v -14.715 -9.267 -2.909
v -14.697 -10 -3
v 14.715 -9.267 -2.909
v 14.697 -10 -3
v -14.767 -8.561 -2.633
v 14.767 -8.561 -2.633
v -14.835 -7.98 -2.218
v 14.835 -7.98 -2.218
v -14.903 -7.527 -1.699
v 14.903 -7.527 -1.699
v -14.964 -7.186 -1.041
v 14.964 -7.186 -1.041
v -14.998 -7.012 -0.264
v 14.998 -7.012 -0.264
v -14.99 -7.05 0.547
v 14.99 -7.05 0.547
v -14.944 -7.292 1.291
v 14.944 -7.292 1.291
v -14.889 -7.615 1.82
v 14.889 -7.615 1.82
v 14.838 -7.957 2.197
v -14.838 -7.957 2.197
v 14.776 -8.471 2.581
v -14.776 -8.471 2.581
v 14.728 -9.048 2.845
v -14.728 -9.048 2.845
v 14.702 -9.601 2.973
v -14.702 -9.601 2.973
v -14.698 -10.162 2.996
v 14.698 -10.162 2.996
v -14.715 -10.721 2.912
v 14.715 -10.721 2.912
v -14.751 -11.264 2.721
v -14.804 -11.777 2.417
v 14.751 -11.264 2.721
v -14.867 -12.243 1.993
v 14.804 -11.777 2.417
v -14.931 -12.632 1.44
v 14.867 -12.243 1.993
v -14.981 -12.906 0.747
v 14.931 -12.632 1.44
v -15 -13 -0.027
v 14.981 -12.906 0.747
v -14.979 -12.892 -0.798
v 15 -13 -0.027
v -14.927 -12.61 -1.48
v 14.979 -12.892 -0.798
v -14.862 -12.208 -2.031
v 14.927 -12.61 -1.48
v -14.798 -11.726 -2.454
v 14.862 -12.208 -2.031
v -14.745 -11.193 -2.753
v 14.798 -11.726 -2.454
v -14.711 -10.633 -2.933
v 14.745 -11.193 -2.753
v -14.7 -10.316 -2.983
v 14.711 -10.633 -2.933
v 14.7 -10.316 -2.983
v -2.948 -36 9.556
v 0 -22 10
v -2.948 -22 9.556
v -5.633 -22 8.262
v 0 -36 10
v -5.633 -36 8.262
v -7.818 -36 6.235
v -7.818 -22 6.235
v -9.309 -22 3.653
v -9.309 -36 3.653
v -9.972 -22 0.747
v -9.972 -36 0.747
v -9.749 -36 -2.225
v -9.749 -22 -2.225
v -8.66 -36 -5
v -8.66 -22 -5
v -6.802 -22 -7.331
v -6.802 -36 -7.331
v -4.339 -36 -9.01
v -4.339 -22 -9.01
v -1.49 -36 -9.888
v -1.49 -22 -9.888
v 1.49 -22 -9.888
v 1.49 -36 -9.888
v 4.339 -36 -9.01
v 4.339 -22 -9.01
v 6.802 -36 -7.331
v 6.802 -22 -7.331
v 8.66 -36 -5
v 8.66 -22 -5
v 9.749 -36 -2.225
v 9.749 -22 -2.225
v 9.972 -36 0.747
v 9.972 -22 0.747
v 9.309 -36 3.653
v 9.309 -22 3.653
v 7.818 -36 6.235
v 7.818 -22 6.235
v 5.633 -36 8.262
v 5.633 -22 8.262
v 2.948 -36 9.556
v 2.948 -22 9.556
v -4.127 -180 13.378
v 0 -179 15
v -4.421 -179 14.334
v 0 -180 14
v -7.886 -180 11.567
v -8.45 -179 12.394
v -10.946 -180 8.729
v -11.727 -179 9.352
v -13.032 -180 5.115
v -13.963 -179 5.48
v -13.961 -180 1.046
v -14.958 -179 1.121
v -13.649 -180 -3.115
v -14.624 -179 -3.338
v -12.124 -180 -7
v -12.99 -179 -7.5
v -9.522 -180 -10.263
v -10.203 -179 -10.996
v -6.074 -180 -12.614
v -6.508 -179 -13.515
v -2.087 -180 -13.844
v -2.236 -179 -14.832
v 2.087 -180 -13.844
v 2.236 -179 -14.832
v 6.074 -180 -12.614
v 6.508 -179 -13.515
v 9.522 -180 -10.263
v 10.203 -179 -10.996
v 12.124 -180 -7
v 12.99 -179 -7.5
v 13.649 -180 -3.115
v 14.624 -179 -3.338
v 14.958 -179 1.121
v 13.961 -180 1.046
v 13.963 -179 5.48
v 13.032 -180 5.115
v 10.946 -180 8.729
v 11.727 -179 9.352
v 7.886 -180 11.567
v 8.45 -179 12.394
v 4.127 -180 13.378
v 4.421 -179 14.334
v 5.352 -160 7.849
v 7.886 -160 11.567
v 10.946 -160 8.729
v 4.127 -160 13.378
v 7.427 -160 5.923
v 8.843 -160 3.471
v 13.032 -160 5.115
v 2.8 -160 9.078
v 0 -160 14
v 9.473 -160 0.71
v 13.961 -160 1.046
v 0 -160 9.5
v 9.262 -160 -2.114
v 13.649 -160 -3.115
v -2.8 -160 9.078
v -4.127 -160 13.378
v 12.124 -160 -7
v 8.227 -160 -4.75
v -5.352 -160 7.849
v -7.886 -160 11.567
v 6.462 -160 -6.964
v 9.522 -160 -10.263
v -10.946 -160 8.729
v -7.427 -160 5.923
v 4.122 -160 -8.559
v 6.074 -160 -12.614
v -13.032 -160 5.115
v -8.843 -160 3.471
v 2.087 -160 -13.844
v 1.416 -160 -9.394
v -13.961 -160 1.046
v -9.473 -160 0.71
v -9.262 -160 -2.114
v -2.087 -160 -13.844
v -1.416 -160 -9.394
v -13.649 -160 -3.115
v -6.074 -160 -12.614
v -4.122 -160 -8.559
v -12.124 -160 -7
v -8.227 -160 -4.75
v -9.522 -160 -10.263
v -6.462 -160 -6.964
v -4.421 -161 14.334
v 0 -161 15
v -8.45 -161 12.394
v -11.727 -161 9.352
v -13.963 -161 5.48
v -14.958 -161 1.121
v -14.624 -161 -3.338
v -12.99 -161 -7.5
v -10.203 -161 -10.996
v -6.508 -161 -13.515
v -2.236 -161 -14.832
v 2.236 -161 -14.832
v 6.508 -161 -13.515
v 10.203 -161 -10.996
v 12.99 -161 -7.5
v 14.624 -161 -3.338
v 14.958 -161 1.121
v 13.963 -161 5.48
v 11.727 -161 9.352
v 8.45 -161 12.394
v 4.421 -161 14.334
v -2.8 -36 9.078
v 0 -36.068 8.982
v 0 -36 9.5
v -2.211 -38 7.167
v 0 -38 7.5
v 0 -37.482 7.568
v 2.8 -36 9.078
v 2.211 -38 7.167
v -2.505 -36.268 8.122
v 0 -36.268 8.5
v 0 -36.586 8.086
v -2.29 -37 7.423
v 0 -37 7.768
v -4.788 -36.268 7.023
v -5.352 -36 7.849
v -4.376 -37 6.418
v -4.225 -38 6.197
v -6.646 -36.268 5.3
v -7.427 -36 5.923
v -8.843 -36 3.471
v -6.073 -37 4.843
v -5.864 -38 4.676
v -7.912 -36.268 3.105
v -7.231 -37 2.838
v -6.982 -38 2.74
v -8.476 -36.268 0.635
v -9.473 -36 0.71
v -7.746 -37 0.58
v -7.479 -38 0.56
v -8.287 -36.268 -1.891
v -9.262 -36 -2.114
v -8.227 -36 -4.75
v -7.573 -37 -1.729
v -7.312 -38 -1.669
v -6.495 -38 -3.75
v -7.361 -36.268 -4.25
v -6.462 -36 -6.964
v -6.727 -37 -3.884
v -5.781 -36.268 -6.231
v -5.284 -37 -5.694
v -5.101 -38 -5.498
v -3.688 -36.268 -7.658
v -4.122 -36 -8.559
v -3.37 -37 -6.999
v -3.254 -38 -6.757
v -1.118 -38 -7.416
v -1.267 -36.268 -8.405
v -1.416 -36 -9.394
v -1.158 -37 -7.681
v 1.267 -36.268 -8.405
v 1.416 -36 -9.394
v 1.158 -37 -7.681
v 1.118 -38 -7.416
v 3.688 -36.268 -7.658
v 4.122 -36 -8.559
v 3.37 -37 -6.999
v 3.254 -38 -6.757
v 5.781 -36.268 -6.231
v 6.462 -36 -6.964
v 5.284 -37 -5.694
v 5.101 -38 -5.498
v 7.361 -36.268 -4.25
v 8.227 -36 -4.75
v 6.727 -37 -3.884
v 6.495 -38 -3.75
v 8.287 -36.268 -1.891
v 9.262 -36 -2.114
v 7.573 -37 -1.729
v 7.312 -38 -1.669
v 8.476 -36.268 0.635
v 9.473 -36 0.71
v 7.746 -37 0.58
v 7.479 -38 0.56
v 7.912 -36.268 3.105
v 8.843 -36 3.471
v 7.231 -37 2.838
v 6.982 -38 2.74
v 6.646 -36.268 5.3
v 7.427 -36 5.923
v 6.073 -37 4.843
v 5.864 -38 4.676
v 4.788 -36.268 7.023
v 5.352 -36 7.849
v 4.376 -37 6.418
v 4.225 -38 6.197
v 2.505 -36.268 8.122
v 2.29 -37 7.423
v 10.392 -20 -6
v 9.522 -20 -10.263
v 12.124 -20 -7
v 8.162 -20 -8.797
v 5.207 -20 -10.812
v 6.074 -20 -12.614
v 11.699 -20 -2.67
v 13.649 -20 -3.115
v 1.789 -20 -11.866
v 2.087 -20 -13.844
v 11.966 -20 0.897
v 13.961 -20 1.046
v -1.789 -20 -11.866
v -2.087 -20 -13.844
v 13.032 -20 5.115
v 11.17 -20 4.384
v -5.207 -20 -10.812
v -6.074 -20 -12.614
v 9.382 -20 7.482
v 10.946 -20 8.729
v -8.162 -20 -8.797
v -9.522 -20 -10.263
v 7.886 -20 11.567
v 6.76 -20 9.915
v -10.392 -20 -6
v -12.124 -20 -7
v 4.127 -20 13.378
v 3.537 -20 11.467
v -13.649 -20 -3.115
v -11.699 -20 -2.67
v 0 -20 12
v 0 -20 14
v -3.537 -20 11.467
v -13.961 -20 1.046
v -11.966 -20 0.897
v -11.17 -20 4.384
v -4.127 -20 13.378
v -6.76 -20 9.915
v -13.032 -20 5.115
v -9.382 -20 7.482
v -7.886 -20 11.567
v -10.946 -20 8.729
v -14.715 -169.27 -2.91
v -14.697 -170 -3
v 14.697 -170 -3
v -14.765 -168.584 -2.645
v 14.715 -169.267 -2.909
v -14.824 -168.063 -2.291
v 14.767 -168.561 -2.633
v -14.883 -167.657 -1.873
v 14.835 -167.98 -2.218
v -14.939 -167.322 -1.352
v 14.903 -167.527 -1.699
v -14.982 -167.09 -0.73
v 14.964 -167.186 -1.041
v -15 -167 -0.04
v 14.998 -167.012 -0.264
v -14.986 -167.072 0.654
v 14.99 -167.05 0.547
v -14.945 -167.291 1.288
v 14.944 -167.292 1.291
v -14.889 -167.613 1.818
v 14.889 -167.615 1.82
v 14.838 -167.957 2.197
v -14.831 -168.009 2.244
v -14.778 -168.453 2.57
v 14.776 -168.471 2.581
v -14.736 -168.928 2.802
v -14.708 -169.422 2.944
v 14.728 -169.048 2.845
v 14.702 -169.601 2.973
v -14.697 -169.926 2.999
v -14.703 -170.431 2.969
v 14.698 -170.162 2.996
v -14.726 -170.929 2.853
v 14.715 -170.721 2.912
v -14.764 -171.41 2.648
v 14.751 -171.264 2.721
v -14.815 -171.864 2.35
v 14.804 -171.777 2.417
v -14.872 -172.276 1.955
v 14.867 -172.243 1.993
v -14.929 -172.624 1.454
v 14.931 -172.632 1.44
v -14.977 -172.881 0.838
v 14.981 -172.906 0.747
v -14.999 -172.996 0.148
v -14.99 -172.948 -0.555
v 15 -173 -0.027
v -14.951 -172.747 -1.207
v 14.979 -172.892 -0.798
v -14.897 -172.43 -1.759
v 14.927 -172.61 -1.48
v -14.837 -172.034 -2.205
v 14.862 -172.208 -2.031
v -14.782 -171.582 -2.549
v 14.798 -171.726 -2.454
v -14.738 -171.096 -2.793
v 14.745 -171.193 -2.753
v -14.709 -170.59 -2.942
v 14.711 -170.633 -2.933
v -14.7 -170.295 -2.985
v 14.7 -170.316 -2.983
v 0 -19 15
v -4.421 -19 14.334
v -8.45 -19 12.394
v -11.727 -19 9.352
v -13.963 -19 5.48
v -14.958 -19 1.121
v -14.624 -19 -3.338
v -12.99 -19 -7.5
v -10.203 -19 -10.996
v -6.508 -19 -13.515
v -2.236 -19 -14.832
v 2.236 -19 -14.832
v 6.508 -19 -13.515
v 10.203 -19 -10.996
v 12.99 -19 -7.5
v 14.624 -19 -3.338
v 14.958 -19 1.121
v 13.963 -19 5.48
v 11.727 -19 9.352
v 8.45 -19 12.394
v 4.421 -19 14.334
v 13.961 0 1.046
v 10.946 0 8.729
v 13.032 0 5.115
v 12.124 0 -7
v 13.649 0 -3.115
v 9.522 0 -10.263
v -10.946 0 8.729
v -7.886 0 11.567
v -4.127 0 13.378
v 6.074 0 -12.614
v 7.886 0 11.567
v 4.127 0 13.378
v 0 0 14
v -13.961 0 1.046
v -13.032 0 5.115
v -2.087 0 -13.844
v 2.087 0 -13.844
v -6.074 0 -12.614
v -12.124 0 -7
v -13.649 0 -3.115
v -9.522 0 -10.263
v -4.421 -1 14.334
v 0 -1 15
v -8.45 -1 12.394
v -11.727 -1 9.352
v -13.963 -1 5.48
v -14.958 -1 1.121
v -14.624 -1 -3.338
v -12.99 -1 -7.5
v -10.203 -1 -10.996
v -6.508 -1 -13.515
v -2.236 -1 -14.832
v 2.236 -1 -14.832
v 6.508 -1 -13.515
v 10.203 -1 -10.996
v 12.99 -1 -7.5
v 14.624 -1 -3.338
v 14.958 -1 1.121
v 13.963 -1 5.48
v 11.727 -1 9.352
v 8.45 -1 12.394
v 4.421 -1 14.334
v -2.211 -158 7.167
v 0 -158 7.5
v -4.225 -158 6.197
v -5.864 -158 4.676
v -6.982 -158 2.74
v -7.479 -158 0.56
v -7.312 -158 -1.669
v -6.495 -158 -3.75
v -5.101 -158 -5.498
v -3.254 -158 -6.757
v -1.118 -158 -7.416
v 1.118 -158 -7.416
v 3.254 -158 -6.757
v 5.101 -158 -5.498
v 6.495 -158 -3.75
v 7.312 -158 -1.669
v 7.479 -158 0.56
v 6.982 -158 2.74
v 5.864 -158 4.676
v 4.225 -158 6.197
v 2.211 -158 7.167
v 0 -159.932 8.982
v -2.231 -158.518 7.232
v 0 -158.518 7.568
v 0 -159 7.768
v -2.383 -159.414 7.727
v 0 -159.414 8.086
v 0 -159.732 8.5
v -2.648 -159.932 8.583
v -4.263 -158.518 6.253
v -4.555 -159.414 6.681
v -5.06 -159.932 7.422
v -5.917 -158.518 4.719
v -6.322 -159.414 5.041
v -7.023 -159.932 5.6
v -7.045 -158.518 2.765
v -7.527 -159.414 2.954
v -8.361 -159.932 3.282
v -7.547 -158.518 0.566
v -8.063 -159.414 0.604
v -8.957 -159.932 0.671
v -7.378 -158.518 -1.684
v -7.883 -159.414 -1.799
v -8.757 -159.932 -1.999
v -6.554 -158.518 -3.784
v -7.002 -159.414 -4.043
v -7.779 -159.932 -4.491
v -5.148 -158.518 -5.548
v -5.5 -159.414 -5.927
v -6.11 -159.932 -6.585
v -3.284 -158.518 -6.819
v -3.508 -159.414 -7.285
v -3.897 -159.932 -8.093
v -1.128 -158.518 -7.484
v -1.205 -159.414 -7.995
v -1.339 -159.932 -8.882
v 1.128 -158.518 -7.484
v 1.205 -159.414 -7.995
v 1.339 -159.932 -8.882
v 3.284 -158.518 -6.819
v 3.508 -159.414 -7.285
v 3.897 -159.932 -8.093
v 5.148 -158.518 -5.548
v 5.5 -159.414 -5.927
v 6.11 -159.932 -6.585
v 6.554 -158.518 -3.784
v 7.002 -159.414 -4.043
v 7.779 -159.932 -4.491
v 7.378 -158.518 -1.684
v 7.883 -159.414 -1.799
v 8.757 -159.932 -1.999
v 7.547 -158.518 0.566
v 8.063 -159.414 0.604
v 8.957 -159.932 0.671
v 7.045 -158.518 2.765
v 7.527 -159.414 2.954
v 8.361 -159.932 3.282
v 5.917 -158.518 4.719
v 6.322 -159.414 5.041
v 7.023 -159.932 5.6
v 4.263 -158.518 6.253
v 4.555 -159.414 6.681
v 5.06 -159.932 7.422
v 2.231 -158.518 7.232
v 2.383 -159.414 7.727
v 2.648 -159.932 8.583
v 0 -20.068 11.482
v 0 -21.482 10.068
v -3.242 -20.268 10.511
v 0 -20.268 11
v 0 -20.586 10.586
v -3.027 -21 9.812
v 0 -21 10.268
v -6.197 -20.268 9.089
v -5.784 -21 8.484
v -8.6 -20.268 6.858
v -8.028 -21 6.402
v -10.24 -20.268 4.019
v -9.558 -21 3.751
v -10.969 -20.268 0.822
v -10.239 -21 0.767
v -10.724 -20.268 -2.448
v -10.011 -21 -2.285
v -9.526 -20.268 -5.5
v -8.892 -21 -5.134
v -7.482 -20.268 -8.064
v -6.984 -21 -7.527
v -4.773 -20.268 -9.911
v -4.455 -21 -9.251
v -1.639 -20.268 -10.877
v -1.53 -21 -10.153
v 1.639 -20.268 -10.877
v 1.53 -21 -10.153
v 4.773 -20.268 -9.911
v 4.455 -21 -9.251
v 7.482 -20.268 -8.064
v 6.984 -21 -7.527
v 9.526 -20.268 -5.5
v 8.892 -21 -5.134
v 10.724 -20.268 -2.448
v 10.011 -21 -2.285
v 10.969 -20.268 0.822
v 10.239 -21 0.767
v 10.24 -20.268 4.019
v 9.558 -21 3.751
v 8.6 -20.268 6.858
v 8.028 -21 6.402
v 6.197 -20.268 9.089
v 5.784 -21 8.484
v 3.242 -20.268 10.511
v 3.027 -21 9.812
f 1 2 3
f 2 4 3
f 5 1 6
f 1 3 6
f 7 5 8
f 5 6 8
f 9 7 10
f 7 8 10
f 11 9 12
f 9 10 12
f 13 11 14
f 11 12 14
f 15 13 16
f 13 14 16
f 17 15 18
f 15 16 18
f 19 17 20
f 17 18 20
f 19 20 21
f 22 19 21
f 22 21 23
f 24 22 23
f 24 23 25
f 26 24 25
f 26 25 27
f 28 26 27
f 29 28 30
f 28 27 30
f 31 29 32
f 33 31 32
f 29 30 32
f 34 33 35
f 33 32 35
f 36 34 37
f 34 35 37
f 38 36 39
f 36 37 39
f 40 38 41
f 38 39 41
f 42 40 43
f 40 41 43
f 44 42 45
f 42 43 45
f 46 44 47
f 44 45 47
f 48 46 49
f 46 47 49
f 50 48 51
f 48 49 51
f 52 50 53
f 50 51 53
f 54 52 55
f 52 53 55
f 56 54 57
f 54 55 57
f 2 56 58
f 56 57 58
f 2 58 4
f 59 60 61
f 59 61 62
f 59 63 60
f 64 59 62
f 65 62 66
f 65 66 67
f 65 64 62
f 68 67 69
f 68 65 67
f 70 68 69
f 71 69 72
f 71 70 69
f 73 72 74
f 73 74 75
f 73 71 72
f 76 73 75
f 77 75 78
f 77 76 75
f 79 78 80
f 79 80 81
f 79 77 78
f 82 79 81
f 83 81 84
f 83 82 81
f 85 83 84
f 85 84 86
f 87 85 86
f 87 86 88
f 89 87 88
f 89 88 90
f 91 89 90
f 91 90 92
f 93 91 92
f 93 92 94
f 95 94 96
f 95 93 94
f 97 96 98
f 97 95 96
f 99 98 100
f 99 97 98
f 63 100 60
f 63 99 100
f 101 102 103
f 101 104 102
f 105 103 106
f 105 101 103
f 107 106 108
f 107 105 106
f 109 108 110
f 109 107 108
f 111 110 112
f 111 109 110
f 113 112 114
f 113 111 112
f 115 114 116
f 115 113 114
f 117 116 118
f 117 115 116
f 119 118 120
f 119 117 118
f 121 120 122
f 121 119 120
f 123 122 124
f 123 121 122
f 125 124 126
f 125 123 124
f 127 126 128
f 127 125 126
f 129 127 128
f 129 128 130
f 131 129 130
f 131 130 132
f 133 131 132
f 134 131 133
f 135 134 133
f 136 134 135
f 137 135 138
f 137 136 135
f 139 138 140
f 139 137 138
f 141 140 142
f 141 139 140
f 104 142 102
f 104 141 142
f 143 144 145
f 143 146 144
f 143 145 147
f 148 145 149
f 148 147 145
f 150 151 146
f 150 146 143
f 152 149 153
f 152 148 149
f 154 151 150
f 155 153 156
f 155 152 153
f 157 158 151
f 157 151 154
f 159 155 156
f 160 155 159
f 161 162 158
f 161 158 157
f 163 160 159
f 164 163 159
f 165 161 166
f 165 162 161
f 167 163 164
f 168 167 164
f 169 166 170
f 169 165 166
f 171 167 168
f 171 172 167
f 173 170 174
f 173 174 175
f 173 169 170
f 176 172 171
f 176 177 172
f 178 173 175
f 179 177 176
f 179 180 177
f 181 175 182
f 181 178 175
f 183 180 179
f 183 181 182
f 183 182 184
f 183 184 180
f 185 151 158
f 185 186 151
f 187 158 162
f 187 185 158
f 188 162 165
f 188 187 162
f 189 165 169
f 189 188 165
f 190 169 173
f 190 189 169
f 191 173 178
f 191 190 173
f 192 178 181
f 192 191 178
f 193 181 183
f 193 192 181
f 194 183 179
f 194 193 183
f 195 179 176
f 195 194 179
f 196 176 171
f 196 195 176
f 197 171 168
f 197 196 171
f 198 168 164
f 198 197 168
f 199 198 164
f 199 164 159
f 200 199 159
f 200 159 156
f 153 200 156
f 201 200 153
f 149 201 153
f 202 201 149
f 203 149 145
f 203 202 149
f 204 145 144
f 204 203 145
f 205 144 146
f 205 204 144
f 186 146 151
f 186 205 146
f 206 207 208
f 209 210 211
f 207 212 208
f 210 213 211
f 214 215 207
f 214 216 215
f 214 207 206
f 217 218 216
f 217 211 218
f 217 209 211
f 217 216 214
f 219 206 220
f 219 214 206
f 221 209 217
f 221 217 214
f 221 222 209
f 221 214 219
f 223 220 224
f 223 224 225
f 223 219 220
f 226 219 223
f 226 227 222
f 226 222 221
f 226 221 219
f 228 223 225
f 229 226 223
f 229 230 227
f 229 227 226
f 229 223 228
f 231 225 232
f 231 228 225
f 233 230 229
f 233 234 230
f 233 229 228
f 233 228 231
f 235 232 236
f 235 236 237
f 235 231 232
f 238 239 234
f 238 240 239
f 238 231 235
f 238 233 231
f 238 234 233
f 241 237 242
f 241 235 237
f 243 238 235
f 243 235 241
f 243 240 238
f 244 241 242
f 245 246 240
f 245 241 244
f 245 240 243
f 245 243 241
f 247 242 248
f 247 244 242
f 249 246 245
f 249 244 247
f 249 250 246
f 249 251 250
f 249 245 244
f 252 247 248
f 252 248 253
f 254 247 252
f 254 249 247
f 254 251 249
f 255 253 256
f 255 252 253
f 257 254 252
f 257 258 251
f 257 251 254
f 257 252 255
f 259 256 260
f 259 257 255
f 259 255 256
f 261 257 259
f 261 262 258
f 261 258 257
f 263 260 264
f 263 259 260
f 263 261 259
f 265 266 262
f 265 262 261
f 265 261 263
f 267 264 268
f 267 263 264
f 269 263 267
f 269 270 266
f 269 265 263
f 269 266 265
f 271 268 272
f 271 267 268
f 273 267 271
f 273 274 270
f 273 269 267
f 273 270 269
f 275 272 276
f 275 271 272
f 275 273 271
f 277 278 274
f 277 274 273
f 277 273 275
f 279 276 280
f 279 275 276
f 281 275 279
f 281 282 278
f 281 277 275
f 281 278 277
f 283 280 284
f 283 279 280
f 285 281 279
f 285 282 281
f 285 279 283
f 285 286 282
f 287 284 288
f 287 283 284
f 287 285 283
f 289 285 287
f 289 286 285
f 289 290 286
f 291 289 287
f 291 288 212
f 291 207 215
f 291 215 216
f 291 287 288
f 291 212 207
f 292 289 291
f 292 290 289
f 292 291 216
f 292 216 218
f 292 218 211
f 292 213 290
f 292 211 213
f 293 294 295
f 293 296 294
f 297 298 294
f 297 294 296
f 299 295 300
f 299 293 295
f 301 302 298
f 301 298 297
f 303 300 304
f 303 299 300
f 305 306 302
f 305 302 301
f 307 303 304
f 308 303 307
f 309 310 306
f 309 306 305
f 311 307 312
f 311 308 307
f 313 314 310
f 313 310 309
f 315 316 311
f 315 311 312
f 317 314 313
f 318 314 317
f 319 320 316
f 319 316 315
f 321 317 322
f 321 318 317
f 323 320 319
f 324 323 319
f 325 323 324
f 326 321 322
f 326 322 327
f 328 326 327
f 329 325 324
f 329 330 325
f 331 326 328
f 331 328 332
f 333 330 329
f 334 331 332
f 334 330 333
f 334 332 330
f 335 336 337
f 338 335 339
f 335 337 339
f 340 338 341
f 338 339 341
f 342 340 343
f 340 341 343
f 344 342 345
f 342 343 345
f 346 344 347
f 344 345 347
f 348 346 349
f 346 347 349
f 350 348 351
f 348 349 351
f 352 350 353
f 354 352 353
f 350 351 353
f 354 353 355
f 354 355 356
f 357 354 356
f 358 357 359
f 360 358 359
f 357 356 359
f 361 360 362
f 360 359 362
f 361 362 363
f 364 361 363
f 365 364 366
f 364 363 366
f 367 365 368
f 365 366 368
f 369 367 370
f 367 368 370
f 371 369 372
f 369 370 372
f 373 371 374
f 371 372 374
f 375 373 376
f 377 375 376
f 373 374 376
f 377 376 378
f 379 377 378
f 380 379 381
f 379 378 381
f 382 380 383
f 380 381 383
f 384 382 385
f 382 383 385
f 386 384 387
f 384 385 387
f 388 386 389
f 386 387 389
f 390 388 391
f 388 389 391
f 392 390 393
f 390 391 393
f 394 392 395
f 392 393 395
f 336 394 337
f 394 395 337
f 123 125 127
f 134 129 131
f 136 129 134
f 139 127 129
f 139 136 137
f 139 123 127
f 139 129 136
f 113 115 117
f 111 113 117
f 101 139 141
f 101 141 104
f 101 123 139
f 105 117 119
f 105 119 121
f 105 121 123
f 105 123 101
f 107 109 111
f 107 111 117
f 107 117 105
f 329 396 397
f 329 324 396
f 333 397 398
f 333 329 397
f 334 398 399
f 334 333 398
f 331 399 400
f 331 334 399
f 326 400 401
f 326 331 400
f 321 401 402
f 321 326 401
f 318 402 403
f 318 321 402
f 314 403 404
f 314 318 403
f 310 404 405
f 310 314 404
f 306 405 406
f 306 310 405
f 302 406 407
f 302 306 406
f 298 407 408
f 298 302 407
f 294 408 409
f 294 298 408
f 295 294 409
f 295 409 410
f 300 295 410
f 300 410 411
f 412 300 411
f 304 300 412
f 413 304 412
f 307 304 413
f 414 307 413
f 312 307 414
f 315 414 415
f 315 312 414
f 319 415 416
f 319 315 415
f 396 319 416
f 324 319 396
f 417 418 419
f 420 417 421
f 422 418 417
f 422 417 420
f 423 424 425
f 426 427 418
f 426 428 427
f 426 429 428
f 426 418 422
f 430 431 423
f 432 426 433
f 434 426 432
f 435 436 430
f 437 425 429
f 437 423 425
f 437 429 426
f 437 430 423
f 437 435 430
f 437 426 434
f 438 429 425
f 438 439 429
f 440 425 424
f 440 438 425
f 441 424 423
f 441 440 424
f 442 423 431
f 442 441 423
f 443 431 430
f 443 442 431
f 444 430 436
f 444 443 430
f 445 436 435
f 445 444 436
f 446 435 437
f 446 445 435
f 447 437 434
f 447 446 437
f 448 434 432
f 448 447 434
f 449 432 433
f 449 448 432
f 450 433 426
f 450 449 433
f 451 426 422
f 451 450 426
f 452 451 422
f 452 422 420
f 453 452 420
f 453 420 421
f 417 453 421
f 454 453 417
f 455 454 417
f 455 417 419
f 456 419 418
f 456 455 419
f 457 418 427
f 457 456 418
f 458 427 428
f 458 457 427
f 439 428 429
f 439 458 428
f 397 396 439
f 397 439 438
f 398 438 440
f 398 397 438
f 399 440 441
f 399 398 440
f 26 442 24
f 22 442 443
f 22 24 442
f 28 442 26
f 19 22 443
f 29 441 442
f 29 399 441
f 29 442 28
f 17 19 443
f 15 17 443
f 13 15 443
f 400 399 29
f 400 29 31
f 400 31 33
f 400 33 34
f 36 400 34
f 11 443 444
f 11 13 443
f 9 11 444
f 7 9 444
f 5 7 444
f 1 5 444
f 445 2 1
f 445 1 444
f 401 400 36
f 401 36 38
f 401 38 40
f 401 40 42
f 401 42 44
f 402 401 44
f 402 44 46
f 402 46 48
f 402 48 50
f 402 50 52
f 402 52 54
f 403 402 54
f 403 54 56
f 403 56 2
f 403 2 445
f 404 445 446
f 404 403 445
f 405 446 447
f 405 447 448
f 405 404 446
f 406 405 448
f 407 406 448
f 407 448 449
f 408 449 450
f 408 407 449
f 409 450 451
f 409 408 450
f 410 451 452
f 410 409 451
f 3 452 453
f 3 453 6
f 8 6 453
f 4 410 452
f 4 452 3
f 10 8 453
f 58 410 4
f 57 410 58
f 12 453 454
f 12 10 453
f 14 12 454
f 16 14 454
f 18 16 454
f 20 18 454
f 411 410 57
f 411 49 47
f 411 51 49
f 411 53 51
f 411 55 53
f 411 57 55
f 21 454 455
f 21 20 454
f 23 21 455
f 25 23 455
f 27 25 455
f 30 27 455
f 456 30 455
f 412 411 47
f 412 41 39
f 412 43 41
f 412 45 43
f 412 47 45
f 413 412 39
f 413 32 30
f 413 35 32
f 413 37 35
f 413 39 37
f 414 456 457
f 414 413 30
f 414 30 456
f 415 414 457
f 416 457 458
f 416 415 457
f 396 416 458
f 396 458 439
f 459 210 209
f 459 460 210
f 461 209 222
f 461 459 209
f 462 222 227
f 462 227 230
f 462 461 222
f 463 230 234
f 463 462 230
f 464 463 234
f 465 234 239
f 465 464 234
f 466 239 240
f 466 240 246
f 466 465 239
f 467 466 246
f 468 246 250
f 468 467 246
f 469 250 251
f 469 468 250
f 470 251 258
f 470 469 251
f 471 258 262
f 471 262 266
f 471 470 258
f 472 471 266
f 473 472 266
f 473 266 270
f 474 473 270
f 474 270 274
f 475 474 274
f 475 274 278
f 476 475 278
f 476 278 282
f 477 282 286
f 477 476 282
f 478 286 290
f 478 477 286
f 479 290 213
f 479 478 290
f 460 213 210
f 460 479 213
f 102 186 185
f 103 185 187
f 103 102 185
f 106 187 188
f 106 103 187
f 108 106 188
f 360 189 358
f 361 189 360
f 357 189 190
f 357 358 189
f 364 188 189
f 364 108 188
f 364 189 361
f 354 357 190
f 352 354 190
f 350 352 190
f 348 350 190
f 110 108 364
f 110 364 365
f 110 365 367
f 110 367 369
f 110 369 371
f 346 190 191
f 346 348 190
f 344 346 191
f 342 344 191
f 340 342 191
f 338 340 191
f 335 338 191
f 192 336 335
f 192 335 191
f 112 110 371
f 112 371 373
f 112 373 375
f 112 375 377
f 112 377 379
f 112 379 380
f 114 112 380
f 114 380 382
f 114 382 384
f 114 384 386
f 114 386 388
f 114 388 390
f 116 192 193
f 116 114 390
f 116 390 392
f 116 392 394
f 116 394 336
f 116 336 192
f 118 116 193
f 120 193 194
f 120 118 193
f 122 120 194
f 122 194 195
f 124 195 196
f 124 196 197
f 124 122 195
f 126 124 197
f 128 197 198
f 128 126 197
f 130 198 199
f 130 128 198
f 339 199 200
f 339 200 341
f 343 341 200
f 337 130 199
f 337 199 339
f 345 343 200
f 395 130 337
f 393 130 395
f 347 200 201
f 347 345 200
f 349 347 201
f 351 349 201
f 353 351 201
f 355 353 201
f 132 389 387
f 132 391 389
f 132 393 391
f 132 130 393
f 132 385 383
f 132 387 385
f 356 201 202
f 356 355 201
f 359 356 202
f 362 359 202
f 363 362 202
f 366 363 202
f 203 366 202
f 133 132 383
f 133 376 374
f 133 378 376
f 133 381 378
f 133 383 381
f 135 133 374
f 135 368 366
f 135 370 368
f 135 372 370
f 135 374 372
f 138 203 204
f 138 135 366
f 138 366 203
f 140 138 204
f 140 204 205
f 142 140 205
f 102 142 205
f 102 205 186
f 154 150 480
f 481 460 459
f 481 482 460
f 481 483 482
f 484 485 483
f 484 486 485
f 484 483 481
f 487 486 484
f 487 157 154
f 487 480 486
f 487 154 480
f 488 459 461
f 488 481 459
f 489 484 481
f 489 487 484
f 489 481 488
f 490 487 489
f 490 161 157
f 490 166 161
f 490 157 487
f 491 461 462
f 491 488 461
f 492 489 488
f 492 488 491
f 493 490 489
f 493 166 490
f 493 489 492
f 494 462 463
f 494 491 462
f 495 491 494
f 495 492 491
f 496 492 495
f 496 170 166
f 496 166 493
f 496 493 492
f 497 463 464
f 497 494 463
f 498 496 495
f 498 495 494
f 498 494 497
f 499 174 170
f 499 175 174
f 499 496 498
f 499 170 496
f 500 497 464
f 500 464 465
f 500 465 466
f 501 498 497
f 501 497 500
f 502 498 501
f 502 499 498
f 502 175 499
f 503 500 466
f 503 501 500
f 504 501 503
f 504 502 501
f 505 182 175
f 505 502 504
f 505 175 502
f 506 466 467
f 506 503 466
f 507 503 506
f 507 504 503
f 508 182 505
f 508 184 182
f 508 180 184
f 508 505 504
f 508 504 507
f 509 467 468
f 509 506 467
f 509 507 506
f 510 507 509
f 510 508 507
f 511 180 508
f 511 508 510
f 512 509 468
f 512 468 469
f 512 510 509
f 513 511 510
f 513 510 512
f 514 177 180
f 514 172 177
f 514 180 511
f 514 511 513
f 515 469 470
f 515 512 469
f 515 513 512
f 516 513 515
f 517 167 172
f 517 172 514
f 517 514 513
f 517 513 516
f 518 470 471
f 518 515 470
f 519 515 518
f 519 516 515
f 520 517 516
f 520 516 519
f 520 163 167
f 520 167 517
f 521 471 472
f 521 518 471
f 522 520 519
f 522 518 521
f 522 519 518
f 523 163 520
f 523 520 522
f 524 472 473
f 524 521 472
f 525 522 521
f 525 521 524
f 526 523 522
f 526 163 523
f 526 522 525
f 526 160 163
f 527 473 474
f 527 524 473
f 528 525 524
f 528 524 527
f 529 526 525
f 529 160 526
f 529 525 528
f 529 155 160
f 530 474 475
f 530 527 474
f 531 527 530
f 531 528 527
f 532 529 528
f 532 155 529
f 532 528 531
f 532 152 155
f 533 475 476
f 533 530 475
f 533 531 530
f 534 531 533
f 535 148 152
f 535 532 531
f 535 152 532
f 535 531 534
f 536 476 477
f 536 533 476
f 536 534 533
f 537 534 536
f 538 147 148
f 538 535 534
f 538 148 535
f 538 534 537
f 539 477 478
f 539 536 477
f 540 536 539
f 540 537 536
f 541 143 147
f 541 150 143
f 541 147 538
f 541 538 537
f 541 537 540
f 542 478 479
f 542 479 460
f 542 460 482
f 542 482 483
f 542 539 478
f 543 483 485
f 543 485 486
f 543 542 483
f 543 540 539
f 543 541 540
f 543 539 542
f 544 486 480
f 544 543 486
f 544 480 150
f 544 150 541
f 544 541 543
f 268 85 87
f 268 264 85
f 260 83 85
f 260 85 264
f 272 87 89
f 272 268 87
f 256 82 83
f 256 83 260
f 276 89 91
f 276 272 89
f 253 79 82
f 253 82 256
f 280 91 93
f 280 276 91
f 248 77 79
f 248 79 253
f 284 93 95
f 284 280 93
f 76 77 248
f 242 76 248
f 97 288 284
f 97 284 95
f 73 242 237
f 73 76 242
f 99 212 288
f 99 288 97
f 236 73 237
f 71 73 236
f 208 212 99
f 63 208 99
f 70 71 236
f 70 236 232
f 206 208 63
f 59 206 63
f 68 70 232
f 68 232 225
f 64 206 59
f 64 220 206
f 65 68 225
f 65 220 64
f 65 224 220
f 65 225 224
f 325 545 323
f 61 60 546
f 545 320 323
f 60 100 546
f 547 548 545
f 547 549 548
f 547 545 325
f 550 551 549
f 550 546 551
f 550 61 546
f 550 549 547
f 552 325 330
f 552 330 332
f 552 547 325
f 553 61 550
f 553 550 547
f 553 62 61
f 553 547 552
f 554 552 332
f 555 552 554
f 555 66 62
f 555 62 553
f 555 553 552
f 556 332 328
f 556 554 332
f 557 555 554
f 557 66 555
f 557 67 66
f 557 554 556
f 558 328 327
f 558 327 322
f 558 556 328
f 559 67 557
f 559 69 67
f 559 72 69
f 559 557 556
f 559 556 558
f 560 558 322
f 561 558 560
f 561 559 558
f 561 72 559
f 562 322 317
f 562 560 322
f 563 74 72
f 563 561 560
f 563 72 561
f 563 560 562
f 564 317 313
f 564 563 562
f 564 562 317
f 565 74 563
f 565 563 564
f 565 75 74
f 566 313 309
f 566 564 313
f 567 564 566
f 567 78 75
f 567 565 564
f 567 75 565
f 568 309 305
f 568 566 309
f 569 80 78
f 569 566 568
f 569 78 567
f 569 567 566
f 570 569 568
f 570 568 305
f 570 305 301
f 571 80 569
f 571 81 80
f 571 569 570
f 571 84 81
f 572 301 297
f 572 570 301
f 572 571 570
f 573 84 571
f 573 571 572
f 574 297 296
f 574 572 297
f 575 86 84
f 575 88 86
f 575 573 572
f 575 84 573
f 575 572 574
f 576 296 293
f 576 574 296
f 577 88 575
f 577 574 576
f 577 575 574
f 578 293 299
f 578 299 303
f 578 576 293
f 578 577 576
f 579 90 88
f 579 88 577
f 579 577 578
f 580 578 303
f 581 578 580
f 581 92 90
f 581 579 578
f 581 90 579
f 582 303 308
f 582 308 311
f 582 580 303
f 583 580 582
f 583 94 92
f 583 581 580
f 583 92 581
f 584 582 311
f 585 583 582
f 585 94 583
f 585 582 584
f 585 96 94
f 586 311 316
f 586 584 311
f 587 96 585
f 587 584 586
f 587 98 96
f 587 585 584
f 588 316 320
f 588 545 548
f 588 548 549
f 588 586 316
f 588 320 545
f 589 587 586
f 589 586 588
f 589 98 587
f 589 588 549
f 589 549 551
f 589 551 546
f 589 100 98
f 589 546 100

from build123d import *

# Parameters (mm, degrees)
ESQUISSE2_R             = 3
ENL_V_MAT_EXTRU_1_DEPTH = 25


with BuildPart() as part:
    # Esquisse1 → Base-Révolution (revolve)
    with BuildSketch(Plane.XY, mode=Mode.PRIVATE) as base_r_volution_sk:
        with BuildLine():
            Line((0, 0), (-14, 0))
            Line((-14, 0), (-15, -1))
            Line((-15, -1), (-15, -19))
            Line((-15, -19), (-14, -20))
            Line((-14, -20), (-12, -20))
            ThreePointArc((-12, -20), (-10.585786438, -20.585786438), (-10, -22))
            Line((-10, -22), (-10, -36))
            Line((-10, -36), (-9.5, -36))
            ThreePointArc((-9.5, -36), (-8.085786438, -36.585786438), (-7.5, -38))
            Line((-7.5, -38), (-7.5, -158))
            ThreePointArc((-7.5, -158), (-8.085786438, -159.414213562), (-9.5, -160))
            Line((-9.5, -160), (-14, -160))
            Line((-14, -160), (-15, -161))
            Line((-15, -161), (-15, -179))
            Line((-15, -179), (-14, -180))
            Line((-14, -180), (0, -180))
            Line((0, -180), (0, 0))
        make_face()
    revolve(base_r_volution_sk.sketch.rotate(Axis((0, 0, 0), (0, -1, 0)), 270), axis=Axis((0, 0, 0), (0, -1, 0)))

    # Esquisse2 → Enlèv. mat.-Extru.1 (cut, symmetric)
    with BuildSketch(Plane(origin=(0, 0, 0), x_dir=(0, 0, -1), z_dir=(1, 0, 0))):
        with Locations((0, -10)):
            Circle(ESQUISSE2_R)
        with Locations((0, -170)):
            Circle(ESQUISSE2_R)
    extrude(amount=ENL_V_MAT_EXTRU_1_DEPTH, both=True, mode=Mode.SUBTRACT)


solid = part.part
